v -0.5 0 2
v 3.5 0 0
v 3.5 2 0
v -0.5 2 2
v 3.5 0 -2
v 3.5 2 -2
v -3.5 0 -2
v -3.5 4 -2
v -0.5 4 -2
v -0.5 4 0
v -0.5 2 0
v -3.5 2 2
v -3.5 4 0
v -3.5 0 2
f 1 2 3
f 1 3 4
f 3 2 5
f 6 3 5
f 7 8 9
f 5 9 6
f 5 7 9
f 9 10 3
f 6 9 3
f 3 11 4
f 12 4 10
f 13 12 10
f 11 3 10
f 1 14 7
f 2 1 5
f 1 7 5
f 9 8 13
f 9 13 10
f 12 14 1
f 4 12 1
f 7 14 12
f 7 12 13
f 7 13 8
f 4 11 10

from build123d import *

# Parameters (mm, degrees)
SKETCH_1_W          = 7
SKETCH_1_H          = 4
EXTRUDE_1_DEPTH     = 4
CUT_EXTRUDE_1_DEPTH = 4
CUT_EXTRUDE_2_DEPTH = 6.4
CUT_EXTRUDE_3_DEPTH = 2
CUT_EXTRUDE_4_DEPTH = 3.8


with BuildPart() as part:
    # 草圖1 → 填料-伸長1 (new body)
    with BuildSketch(Plane(origin=(0, 0, 0), x_dir=(1, 0, 0), z_dir=(0, 1, 0))):
        Rectangle(SKETCH_1_W, SKETCH_1_H)
    extrude(amount=EXTRUDE_1_DEPTH)

    # 草圖2 → 除料-伸長1 (cut)
    with BuildSketch(Plane.XY.offset(2)):
        Polygon((3.5, 4), (-0.5, 4), (3.5, 2), align=None)
    extrude(amount=-CUT_EXTRUDE_1_DEPTH, mode=Mode.SUBTRACT)

    # 草圖3 → 除料-伸長2 (cut)
    with BuildSketch(Plane(origin=(0, 0, 0), x_dir=(1, 0, 0), z_dir=(0, 1, 0))):
        Polygon((-0.5, -2), (3.5, -2), (3.5, 0), align=None)
    extrude(amount=CUT_EXTRUDE_2_DEPTH, mode=Mode.SUBTRACT)

    # 草圖4 → 除料-伸長3 (cut)
    with BuildSketch(Plane(origin=(0, 4, 0), x_dir=(1, 0, 0), z_dir=(0, 1, 0))):
        Polygon((3.5, 0), (-0.5, 0), (-0.5, -2), align=None)
    extrude(amount=-CUT_EXTRUDE_3_DEPTH, mode=Mode.SUBTRACT)

    # 草圖5 → 除料-伸長4 (cut)
    with BuildSketch(Plane(origin=(-0.5, 0, 0), x_dir=(0, 0, -1), z_dir=(1, 0, 0))):
        Polygon((0, 4), (-2, 4), (-2, 2), align=None)
    extrude(amount=-CUT_EXTRUDE_4_DEPTH, mode=Mode.SUBTRACT)


solid = part.part
